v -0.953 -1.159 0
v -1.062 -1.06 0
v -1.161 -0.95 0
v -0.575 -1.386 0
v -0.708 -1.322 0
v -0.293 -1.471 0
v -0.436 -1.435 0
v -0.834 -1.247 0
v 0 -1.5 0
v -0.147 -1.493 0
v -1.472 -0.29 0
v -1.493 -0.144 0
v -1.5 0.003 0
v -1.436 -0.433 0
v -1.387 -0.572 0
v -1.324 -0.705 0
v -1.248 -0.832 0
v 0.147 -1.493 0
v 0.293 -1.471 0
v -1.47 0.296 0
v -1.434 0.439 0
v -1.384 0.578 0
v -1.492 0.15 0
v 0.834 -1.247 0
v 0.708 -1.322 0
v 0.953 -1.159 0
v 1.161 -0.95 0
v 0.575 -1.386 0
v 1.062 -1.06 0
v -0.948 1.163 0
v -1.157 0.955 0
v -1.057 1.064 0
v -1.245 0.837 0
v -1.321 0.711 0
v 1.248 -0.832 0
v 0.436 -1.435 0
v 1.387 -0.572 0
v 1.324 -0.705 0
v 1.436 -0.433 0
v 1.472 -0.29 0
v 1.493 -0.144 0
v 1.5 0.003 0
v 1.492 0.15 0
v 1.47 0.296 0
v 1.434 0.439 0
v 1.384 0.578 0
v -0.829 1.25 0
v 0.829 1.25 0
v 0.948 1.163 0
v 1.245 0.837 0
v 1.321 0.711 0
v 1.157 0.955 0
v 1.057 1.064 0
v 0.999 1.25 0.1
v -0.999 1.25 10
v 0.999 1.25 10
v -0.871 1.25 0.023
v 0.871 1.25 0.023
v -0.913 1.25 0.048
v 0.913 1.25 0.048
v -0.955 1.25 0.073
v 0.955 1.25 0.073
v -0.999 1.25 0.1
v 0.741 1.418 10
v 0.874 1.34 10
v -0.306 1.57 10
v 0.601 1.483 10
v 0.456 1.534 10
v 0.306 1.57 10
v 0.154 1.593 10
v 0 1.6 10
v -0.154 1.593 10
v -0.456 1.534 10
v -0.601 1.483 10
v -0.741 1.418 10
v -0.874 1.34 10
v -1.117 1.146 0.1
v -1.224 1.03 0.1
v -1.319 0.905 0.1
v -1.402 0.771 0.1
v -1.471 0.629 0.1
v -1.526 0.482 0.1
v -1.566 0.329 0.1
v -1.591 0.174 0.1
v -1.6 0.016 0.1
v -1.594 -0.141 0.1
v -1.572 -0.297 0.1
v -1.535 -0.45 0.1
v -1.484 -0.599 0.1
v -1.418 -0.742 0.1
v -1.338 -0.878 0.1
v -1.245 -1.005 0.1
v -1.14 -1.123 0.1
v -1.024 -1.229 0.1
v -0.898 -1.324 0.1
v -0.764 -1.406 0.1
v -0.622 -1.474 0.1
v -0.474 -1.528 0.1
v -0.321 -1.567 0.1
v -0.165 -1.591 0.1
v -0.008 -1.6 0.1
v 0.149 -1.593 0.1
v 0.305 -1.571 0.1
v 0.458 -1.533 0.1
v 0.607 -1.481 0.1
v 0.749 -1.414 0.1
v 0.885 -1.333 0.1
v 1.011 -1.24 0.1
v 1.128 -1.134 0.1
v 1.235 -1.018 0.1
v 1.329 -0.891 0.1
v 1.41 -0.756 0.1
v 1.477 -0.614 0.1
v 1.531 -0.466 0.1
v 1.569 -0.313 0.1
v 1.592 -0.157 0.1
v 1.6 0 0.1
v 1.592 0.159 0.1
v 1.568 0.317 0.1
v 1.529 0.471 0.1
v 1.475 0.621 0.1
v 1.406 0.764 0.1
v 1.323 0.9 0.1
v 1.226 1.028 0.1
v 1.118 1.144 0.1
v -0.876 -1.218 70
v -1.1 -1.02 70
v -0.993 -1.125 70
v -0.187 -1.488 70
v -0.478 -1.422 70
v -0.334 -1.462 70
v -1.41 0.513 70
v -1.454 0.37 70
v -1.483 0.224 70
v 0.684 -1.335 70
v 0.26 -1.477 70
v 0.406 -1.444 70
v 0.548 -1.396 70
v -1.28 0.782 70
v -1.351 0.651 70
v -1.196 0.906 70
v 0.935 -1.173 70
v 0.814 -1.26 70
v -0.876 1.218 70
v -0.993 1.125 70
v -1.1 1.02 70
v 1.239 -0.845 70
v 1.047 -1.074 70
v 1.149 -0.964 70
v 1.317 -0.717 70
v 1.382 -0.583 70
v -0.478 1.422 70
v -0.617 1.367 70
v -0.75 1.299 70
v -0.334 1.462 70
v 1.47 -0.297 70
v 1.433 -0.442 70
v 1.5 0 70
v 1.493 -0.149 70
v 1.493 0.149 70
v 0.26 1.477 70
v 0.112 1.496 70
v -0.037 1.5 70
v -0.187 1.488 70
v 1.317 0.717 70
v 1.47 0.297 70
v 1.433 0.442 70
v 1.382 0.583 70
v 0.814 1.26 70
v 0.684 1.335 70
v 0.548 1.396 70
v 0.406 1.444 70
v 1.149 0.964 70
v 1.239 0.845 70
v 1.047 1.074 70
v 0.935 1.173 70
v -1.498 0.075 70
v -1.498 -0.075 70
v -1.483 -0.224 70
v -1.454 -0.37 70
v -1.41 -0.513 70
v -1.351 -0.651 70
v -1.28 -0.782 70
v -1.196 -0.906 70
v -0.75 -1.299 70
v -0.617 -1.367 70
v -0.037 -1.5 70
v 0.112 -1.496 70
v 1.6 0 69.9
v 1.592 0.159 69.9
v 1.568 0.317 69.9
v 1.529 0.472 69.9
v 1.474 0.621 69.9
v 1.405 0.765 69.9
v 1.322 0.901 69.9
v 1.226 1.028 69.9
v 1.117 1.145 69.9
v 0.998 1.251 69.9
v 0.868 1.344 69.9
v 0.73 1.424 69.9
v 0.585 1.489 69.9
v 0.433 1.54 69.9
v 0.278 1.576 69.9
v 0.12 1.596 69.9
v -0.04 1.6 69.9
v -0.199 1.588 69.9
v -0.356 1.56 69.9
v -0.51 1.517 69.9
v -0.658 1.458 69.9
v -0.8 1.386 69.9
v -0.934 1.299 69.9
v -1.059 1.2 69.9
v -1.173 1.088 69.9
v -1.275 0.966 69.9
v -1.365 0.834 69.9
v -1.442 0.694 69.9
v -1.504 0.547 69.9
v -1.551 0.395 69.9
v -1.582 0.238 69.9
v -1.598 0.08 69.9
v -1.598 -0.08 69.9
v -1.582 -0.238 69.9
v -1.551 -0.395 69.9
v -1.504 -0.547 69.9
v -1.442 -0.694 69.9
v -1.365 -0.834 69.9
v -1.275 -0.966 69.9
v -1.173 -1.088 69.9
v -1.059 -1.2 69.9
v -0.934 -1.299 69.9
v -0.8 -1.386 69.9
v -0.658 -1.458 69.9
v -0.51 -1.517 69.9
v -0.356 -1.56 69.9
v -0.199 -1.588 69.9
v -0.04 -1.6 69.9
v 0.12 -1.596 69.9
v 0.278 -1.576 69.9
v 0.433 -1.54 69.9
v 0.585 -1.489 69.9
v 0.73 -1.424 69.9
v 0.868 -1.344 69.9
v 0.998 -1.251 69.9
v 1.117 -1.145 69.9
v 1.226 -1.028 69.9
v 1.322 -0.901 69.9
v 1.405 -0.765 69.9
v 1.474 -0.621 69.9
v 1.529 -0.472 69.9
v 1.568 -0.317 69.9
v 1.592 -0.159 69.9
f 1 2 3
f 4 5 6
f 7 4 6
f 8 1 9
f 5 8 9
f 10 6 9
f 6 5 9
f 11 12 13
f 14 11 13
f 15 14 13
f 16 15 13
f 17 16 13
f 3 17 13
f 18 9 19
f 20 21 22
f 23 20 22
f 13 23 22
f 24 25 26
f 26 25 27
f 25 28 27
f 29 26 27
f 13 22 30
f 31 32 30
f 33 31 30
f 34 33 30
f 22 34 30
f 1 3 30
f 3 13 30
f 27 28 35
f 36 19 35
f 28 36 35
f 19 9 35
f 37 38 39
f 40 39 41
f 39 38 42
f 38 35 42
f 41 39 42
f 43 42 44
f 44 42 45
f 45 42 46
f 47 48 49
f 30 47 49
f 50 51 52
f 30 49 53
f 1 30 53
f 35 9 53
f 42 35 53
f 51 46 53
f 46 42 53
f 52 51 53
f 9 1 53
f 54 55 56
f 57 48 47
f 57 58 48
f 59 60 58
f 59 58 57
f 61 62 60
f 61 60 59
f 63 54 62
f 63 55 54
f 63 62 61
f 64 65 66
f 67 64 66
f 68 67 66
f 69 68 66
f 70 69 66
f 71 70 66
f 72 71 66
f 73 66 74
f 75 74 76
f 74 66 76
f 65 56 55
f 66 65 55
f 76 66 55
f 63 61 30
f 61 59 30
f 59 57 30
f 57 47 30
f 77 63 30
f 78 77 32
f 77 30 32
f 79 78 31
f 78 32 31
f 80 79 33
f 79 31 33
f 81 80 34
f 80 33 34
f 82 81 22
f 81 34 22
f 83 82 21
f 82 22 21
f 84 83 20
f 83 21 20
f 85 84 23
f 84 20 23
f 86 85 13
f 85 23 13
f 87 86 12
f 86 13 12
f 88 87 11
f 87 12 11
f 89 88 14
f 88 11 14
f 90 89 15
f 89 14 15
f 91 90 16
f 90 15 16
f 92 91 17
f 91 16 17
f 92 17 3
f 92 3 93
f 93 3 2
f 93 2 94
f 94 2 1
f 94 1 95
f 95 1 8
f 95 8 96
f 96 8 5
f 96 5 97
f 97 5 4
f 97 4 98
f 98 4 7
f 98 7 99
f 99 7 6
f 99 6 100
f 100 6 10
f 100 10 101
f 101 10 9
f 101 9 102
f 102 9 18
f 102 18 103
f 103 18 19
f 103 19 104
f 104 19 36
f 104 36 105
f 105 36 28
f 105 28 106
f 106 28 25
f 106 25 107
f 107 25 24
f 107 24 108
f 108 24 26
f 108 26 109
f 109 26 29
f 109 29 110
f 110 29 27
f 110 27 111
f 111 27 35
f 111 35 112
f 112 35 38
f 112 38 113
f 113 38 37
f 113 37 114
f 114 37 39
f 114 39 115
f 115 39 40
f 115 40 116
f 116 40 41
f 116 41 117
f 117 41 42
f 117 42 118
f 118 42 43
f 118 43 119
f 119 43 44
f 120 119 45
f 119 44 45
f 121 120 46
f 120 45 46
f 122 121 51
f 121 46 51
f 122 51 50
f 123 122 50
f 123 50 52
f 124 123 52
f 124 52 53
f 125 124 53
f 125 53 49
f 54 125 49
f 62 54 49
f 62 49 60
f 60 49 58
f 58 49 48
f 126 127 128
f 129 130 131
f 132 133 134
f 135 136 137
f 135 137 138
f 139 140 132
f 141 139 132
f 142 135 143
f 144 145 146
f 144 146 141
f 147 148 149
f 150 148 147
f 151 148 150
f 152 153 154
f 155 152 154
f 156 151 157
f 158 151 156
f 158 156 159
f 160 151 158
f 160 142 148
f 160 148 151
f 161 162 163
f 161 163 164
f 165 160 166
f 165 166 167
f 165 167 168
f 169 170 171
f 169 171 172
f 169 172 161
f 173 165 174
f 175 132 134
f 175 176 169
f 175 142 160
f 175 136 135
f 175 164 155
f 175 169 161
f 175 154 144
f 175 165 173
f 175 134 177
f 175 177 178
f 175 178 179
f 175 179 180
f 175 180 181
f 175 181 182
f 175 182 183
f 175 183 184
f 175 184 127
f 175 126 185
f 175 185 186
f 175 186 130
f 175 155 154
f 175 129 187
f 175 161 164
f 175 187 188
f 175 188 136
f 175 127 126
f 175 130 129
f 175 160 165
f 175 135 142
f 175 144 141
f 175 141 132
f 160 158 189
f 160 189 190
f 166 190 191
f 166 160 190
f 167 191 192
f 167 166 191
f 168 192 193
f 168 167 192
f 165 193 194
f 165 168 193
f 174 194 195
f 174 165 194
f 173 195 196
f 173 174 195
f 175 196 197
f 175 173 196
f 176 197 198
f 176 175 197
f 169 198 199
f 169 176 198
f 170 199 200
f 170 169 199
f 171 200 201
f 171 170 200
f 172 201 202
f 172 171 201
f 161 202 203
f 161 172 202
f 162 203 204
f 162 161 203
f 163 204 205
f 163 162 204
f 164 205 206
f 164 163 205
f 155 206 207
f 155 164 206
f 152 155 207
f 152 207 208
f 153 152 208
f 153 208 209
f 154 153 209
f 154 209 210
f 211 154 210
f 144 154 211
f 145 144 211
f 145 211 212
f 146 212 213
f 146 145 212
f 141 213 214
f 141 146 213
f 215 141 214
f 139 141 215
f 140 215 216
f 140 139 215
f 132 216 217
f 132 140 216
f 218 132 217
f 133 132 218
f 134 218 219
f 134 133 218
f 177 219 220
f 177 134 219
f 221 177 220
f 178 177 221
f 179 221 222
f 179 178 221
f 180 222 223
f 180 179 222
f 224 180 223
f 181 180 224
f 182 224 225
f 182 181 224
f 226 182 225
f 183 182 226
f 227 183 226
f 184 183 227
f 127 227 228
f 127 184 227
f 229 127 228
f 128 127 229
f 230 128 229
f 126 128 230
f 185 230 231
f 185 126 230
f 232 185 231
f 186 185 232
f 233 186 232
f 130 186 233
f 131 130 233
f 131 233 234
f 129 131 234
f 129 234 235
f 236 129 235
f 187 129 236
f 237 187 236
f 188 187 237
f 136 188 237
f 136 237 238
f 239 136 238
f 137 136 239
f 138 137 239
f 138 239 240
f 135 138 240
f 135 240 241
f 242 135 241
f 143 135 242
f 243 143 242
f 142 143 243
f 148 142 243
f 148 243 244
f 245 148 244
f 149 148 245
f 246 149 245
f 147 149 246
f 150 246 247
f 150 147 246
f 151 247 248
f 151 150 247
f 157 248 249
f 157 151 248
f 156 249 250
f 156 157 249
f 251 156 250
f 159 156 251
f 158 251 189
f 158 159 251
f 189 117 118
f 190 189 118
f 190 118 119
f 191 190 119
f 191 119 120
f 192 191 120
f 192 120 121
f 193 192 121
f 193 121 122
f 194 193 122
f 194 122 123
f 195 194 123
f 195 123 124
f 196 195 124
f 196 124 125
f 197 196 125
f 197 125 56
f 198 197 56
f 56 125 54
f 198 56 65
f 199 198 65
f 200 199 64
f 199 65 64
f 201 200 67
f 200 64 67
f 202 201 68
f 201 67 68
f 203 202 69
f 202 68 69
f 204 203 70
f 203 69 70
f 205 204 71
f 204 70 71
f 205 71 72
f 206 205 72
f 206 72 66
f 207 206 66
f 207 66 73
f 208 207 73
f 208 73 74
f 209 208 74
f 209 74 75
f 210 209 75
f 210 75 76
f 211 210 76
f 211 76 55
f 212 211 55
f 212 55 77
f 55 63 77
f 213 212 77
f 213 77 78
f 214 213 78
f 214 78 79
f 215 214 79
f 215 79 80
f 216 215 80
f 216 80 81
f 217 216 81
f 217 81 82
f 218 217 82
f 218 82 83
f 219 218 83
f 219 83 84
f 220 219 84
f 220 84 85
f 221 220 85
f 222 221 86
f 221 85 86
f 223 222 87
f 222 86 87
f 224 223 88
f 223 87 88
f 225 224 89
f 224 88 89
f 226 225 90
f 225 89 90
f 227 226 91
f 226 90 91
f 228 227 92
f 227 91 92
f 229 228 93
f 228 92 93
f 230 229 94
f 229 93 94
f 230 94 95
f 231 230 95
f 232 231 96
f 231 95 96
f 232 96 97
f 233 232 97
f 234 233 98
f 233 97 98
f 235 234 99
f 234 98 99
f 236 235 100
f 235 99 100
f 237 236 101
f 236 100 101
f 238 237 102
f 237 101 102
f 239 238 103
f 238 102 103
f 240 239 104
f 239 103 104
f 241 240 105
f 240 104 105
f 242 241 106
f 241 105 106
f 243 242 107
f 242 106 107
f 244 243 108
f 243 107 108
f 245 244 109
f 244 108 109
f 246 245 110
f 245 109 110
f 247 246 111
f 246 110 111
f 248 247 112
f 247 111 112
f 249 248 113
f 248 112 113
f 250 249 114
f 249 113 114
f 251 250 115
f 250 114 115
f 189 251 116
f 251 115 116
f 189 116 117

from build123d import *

# Parameters (mm, degrees)
SKETCH1_R               = 1.6
BOSS_EXTRUDE1_DEPTH     = 70
SKETCH2_W               = 10
SKETCH2_H               = 0.35
CUT_EXTRUDE1_DEPTH      = 2.6
CUT_EXTRUDE1_DEPTH_BACK = 2.6
CHAMFER1_SIZE           = 0.1


with BuildPart() as part:
    # Sketch1 → Boss-Extrude1 (new body)
    with BuildSketch(Plane.XY):
        Circle(SKETCH1_R)
    extrude(amount=BOSS_EXTRUDE1_DEPTH)

    # Sketch2 → Cut-Extrude1 (cut, two sides)
    with BuildSketch(Plane(origin=(0, 0, 0), x_dir=(0, 0, -1), z_dir=(1, 0, 0))) as cut_extrude1_sk:
        with Locations((-5, 1.425)):
            Rectangle(SKETCH2_W, SKETCH2_H)
    extrude(amount=CUT_EXTRUDE1_DEPTH, mode=Mode.SUBTRACT)
    extrude(cut_extrude1_sk.sketch, amount=-CUT_EXTRUDE1_DEPTH_BACK, mode=Mode.SUBTRACT)

    # Chamfer1
    chamfer1_edges = [part.edges().sort_by_distance(p)[0] for p in [
        (-1.6, 0, 70),
        (-0.693542087, -1.441873564, 0),
    ]]
    chamfer(chamfer1_edges, length=CHAMFER1_SIZE)


solid = part.part
